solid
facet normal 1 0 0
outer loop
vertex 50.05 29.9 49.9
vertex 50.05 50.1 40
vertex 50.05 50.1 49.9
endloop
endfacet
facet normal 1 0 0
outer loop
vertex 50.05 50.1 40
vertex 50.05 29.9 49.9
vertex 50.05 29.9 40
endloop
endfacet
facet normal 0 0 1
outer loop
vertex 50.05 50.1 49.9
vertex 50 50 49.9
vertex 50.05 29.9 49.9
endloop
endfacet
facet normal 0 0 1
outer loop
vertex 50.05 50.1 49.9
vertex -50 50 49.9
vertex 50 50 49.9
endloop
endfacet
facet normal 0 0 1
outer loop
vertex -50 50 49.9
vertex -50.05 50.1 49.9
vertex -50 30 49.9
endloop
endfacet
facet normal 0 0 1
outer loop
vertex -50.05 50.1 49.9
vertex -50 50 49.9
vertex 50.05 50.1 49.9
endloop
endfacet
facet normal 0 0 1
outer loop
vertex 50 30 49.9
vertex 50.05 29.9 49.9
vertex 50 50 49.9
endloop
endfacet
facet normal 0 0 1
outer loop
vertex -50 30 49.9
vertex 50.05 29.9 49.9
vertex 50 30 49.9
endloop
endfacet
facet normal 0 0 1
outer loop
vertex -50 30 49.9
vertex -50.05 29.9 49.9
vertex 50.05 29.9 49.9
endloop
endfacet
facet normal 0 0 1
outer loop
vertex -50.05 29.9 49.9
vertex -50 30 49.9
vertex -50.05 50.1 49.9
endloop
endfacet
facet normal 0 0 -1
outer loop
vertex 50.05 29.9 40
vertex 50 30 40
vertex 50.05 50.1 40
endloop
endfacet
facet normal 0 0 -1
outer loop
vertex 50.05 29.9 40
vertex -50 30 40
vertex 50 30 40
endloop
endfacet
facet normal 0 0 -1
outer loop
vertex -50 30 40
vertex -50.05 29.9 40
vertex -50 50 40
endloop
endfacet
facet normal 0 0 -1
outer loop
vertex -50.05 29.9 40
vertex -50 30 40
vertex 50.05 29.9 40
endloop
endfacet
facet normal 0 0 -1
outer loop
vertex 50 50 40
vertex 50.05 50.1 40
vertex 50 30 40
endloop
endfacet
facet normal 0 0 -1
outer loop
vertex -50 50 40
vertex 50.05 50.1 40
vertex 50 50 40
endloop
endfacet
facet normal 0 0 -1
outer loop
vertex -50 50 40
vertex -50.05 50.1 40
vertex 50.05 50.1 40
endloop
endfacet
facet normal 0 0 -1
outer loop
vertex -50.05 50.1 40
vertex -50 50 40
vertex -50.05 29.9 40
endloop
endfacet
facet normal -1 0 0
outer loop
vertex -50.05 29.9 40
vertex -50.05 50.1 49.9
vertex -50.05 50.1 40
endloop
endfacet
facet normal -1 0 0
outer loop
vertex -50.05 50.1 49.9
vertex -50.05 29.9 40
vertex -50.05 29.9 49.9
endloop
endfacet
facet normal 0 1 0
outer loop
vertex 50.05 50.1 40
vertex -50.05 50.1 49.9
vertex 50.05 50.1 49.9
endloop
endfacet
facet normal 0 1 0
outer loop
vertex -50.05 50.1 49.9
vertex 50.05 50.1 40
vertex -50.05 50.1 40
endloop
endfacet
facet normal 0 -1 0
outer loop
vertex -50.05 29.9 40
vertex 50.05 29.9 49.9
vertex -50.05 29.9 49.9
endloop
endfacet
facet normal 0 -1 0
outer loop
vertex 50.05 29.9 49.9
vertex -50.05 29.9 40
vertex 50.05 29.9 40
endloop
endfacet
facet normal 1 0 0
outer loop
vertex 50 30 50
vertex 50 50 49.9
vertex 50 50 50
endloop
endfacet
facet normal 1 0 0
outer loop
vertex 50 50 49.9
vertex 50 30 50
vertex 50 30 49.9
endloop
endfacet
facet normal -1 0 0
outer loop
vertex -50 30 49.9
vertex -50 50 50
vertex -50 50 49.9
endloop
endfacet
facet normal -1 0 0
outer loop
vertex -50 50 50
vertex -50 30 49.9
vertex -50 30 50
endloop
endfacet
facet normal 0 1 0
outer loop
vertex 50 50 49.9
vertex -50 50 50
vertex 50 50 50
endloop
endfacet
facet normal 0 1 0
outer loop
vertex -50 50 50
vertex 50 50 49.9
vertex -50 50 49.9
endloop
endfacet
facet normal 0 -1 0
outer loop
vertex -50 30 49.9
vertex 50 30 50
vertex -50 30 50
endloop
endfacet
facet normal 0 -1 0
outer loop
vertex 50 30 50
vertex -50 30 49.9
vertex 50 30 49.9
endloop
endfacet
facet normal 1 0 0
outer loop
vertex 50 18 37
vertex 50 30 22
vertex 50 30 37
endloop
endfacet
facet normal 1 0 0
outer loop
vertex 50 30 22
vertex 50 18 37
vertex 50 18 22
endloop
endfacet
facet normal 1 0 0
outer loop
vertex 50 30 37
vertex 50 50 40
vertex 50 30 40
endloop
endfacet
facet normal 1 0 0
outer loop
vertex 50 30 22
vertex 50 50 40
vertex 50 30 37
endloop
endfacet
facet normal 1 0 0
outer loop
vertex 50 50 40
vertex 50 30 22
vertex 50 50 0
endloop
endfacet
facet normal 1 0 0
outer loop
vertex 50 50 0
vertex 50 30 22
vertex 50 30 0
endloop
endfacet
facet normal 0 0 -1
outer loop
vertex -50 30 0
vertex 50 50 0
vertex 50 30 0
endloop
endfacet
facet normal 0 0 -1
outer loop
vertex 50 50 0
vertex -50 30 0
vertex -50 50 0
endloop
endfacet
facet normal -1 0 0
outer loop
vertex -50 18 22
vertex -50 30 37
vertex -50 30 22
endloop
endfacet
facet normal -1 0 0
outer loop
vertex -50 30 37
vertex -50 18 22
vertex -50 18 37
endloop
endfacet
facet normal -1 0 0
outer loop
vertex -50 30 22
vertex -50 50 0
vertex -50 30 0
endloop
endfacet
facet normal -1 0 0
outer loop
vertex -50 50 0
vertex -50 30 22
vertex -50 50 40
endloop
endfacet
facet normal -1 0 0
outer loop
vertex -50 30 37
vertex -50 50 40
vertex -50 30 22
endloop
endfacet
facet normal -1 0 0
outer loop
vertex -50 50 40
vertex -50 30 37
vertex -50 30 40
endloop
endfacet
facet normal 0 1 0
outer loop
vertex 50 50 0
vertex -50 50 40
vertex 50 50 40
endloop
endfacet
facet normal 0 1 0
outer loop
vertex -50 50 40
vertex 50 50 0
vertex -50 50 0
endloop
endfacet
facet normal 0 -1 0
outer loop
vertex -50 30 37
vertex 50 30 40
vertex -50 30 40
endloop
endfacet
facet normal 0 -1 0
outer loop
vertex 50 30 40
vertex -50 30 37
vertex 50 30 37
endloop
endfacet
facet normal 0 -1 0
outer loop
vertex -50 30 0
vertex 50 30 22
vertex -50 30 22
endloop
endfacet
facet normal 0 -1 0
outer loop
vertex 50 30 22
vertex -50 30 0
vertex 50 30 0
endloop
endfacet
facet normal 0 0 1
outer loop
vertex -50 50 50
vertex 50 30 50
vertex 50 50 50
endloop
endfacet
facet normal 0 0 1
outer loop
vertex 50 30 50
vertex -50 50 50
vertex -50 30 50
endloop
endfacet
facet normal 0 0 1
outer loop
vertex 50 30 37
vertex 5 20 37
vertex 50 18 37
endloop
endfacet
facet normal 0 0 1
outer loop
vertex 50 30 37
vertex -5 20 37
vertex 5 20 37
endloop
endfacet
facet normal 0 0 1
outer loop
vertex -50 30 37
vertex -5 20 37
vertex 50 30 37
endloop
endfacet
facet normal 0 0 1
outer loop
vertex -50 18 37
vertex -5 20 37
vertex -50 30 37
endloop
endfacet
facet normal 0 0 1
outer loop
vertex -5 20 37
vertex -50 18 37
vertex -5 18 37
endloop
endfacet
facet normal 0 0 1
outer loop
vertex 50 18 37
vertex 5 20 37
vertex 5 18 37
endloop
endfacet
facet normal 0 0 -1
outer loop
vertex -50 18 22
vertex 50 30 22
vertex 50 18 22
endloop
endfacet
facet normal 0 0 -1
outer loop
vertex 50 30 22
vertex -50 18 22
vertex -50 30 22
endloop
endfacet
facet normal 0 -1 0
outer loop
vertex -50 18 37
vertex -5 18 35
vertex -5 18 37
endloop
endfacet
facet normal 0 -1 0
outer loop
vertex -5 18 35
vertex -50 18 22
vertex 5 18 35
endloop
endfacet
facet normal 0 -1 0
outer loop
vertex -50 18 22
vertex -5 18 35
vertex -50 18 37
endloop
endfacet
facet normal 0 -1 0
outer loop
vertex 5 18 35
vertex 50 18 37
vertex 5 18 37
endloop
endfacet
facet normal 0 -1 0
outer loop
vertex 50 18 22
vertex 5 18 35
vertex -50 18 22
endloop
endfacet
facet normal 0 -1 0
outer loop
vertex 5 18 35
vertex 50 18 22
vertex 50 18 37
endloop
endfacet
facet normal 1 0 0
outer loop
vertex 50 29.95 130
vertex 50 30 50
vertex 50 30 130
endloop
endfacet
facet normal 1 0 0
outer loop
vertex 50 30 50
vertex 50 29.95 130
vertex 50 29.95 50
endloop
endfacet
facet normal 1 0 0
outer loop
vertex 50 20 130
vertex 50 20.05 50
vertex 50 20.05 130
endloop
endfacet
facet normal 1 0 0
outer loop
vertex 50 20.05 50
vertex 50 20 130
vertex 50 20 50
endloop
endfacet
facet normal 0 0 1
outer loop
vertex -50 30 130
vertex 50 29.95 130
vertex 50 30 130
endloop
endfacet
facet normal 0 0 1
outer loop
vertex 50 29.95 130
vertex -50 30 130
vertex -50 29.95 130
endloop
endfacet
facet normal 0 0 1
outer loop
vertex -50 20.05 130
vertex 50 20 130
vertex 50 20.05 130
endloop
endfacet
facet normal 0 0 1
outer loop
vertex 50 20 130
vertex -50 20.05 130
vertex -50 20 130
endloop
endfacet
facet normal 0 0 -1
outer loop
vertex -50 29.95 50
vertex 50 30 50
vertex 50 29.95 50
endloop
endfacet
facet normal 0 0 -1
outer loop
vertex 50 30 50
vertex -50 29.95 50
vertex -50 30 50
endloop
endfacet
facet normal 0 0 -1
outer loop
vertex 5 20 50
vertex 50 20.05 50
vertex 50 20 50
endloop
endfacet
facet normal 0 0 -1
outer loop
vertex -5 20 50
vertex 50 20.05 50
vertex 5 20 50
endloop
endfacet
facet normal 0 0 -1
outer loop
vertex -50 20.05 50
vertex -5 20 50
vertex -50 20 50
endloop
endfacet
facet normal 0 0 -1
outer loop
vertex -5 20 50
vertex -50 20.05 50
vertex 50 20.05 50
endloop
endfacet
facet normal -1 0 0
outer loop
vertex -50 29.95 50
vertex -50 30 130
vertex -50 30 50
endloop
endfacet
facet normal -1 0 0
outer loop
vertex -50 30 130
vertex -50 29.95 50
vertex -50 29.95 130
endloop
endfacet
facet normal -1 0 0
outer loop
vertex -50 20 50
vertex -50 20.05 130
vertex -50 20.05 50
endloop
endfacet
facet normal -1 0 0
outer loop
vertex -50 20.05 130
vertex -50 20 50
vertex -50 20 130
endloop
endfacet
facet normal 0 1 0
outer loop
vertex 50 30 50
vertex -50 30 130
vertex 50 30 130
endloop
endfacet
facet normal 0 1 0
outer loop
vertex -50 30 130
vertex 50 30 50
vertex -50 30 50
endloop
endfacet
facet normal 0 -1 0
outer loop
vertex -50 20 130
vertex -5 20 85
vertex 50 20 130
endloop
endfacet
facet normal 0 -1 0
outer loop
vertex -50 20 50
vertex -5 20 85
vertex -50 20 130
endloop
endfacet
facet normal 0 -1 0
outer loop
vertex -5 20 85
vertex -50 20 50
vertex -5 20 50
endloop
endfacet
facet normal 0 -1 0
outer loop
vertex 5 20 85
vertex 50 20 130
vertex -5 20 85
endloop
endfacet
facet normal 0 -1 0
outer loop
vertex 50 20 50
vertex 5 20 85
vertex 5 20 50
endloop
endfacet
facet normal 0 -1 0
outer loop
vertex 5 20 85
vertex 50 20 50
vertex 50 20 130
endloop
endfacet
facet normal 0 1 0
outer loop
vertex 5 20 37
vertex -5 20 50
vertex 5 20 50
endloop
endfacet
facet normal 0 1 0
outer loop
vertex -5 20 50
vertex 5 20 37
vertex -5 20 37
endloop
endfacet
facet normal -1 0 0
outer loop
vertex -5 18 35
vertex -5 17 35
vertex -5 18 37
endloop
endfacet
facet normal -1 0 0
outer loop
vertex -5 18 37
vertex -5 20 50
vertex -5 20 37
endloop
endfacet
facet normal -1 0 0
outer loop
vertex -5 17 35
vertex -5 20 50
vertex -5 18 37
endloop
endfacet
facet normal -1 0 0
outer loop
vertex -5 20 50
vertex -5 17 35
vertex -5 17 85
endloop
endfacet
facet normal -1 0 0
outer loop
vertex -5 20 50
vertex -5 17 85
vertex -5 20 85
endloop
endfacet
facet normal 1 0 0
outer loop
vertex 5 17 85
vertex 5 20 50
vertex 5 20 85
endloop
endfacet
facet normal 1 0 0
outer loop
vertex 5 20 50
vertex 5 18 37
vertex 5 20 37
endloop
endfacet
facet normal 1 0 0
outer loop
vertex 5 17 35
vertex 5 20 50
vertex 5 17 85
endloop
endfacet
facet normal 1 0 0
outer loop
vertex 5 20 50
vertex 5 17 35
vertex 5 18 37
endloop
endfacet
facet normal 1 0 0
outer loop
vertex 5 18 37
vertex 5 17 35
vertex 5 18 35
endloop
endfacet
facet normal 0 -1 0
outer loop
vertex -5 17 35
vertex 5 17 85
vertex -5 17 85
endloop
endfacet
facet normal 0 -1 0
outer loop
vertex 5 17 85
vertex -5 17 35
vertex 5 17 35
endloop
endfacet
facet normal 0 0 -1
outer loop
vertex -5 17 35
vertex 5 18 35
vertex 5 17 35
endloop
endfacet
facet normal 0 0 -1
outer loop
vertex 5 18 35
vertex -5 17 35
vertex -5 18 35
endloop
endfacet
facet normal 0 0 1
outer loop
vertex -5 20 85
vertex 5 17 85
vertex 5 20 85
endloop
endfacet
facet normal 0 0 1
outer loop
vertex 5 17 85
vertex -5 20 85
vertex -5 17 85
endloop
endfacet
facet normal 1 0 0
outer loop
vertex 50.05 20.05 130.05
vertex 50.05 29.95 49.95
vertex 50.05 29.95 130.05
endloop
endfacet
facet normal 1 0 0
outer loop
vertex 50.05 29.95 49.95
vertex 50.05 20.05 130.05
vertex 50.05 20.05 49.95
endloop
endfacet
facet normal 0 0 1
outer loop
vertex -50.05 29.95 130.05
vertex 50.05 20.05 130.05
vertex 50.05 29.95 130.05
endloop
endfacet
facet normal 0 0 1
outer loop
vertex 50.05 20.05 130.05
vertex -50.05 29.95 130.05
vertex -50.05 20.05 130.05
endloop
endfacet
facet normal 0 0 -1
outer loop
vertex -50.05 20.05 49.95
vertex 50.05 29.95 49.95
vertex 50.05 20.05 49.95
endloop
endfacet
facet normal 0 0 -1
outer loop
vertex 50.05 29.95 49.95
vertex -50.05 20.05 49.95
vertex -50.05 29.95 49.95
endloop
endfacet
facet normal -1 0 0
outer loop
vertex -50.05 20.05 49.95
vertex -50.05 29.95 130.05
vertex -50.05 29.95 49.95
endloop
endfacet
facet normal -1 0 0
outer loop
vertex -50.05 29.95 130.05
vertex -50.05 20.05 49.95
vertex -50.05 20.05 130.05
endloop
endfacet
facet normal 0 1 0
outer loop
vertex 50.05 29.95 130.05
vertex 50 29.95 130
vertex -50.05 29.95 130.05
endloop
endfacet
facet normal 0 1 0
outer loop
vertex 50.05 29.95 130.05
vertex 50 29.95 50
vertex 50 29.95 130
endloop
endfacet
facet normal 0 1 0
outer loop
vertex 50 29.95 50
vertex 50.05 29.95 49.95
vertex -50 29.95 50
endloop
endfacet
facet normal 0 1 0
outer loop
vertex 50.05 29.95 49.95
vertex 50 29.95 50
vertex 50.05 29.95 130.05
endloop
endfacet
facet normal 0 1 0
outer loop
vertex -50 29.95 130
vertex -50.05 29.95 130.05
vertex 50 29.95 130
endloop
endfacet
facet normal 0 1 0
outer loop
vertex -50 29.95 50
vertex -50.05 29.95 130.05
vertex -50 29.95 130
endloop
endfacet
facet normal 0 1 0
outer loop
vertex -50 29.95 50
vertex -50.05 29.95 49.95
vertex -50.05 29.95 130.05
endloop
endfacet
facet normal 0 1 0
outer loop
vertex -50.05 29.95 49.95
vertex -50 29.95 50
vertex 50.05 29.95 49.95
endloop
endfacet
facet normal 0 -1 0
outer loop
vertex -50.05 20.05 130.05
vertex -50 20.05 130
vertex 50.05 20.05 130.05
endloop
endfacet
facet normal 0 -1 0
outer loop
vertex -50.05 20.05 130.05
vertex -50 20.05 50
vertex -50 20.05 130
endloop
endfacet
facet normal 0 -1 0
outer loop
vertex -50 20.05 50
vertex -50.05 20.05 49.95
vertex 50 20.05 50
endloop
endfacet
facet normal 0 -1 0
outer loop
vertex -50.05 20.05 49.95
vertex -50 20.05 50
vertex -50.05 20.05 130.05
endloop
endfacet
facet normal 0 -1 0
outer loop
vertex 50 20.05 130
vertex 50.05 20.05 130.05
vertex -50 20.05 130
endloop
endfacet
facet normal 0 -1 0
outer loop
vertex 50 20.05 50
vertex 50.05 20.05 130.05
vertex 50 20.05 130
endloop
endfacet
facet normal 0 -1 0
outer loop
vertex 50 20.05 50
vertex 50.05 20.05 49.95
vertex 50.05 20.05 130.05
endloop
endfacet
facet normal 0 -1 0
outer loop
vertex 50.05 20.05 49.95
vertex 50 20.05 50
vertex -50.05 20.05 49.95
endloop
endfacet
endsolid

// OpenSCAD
//referenceCube();
counterBase();
counterOverBase();
counterOverBaseRim();

liftMechanism();

counterOpen();
armOpen();
counterOpenRim();

//counterClosed();
//armClosed();
//counterClosedRim();

module counterBase() {
    color("white")
    translate([-50, 30, 0])
    cube([100, 20, 40]);
}

module counterOverBase() {
    color("brown")
    translate([-50, 30, 40])
    cube([100, 20, 10]);
}

module counterOverBaseRim() {
    difference() {
        color("green")
        translate([-50.05, 30-0.1, 40])
        cube([100.1, 20.2, 9.9]);
        
        translate([0, 0, -0.01])
        counterOverBase();
    }
}

module counterOpen() {
    color("brown")
    translate([-50, 20, 50])
    cube([100, 10, 80]);
}

module counterOpenRim() {
    color("green")
    translate([-50.05, 20.05, 49.95])
    cube([100.1, 9.9, 80.1]);
}

module liftMechanism() {
    color("black")
    translate([-50, 18, 22])
    cube([100, 12, 15]);
}

module armOpen() {
    color("silver")
    translate([-5, 20, 35])
    rotate([90, 0, 0])
    cube([10, 50, 3]);
}

module armClosed() {
    color("silver")
    translate([-5, -30, 38])
    rotate([-5, 0, 0])
    cube([10, 50, 3]);
}

module counterClosed() {
    color("brown")
    translate([-50, -50, 40])
    cube([100, 80, 10]);
}

module counterClosedRim() {
    difference() {
        color("green")
        translate([-50.05, -50.05, 40])
        cube([100.1, 80.1, 9.9]);
        
        translate([0, 0, -0.01])
        counterClosed();
    }
}

module referenceCube() {
    translate([-50, -200, 0])
    cube([100, 100, 100]);
}
